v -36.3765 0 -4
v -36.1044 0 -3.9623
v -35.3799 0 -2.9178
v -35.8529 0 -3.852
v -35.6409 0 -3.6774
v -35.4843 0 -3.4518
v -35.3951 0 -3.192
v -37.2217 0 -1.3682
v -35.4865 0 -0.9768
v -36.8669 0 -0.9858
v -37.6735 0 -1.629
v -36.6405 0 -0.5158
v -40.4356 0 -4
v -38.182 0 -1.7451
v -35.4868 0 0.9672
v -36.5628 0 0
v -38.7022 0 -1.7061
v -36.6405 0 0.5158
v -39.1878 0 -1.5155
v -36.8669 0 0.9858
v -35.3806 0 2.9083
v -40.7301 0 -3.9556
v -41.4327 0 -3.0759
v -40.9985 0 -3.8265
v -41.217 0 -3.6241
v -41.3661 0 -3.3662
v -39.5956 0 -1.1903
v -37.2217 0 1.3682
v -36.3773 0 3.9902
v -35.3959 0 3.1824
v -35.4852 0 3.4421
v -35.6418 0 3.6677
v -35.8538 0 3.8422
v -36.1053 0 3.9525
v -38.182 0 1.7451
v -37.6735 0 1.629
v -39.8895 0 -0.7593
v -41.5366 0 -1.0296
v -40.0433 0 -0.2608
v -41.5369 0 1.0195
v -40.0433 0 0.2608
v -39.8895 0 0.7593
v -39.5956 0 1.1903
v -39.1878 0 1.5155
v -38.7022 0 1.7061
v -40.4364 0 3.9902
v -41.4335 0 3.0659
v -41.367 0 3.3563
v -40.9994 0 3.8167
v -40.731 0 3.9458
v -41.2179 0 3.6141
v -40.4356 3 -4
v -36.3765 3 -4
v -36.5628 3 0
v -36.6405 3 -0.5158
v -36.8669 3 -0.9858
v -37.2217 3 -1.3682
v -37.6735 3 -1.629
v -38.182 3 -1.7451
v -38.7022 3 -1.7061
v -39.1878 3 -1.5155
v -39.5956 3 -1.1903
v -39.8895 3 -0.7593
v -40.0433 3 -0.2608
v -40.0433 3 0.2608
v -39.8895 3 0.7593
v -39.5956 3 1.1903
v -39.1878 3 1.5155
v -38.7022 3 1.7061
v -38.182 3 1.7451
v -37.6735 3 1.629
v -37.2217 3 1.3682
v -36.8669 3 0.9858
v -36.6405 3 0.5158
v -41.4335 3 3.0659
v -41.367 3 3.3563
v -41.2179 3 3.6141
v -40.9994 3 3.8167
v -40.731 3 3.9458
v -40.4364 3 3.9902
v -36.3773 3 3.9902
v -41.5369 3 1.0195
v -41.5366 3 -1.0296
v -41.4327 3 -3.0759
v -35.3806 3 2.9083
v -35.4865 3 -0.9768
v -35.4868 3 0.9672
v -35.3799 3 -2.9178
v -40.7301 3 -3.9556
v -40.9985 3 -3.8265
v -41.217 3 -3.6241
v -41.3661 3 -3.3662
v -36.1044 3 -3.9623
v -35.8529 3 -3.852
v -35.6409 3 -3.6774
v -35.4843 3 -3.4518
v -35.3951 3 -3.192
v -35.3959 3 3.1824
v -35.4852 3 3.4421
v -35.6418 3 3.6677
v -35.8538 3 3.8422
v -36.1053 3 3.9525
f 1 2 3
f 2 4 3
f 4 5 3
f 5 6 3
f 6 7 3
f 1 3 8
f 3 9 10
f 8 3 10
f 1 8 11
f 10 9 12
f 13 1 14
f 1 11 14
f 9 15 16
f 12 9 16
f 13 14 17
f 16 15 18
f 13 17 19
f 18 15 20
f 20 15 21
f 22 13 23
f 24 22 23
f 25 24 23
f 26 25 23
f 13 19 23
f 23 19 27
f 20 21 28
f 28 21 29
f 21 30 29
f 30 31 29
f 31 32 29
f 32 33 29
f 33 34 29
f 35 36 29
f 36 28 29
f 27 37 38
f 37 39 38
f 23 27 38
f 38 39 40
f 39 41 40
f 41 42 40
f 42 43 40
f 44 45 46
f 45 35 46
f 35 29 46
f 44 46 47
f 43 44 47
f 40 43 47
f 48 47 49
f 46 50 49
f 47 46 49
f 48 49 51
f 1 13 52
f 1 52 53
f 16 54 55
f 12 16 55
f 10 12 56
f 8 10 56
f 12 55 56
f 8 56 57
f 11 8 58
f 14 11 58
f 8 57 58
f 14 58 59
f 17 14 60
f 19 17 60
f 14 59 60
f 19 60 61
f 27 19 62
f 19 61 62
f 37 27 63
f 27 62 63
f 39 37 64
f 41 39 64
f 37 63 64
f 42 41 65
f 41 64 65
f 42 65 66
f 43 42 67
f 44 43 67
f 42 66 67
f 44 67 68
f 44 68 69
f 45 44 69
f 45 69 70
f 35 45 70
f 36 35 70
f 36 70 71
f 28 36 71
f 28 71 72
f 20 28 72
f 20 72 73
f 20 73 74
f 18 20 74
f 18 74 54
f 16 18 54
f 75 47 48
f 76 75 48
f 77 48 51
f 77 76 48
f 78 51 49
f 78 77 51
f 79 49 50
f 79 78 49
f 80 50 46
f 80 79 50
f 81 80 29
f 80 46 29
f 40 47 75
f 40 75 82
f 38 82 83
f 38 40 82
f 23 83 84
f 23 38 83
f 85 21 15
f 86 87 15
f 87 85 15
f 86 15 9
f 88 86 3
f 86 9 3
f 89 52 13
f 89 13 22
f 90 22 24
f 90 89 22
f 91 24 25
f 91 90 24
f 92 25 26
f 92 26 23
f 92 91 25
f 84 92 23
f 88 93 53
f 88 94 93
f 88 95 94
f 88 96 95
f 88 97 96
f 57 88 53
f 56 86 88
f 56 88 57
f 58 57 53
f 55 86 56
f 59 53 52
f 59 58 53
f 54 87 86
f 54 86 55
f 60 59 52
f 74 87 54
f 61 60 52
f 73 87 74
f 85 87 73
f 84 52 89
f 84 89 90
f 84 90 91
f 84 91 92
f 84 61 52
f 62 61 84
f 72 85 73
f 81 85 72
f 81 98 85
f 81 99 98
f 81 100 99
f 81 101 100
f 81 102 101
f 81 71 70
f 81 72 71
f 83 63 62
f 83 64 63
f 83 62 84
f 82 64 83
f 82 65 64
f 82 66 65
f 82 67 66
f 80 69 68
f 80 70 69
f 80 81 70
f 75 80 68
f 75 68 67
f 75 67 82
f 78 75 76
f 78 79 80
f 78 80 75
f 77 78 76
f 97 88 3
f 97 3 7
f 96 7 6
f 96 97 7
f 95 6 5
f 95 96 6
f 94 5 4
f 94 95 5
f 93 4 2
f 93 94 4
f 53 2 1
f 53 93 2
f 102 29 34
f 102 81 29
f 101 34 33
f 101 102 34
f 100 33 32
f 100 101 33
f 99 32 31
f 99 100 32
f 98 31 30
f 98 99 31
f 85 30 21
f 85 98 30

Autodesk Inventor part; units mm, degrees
ref_plane "YZ Plane" through (0, 0, 0) normal (1, 0, 0) x (0, 1, 0)
ref_plane "XZ Plane" through (0, 0, 0) normal (0, 1, 0) x (-1, 0, 0)
ref_plane "XY Plane" through (0, 0, 0) normal (0, 0, 1) x (1, 0, 0)
sketch "Sketch1" plane through (0, 0, 0) normal (0, 1, 0) x (-1, 0, 0)
  arc A0 (0, -35.5) -> (0, 35.5) centre (0, 0) ccw construction
  arc A1 (-2.5809, -40.3369) -> (-17.4082, 36.0494) centre (1.0497, 0) ccw construction
  arc A2 (39.0973, -13.8791) -> (40.8076, 7.7173) centre (1.0497, 0) ccw construction
  line L0 (41.5497, -0.0049) -> (41.3517, -4) construction
  line L1 (41.5497, -0.0049) -> (41.3527, 3.9902) construction
  arc A3 (41.3517, -4) -> (41.3527, 3.9902) centre (1.0497, 0) ccw
  line L2 (35.5, 0) -> (35.5, -4) construction
  line L3 (35.5, 0) -> (35.5, 4) construction
  arc A4 (35.2739, -4) -> (35.275, 3.9902) centre (0, 0) ccw construction
  arc A5 (35.2739, -4) -> (35.275, 3.9902) centre (0, 0) ccw
  line L4 (41.3527, 3.9902) -> (35.275, 3.9902)
  line L5 (41.3517, -4) -> (35.2739, -4)
  dimension "d7" = 0
  dimension "d8" = 40.5
  dimension "d9" = 35.5
  dimension "d14" = 4
  dimension "d15" = 4
  dimension "d18" = 4
  dimension "d19" = 4
extrude "Extrusion1" add sketch "Sketch1" along normal blind 3
sketch "Sketch2" plane through (0, 3, 0) normal (0, 1, 0) x (1, 0, 0)
  arc A0 (-41.3517, 4) -> (-41.3527, -3.9902) centre (-1.0497, 0) ccw projected
  line L0 (-41.3527, -3.9902) -> (-35.275, -3.9902) projected
  arc A1 (-35.2739, 4) -> (-35.275, -3.9902) centre (0, 0) ccw projected
  line L1 (-35.2739, 4) -> (-41.3517, 4) projected
  circle A2 centre (-38.3128, 0) radius 1.75
  point P0 (0, 0)
  dimension "d22" = 3.5
extrude "Extrusion2" cut sketch "Sketch2" along normal through all both and the other way through all contours A2
fillet "Fillet1" radius 1 4 edges at (-41.3527, 1.5, 3.9902) (-41.3517, 1.5, -4) (-35.2739, 1.5, -4) (-35.275, 1.5, 3.9902)
properties part number "reverse gear link block"
